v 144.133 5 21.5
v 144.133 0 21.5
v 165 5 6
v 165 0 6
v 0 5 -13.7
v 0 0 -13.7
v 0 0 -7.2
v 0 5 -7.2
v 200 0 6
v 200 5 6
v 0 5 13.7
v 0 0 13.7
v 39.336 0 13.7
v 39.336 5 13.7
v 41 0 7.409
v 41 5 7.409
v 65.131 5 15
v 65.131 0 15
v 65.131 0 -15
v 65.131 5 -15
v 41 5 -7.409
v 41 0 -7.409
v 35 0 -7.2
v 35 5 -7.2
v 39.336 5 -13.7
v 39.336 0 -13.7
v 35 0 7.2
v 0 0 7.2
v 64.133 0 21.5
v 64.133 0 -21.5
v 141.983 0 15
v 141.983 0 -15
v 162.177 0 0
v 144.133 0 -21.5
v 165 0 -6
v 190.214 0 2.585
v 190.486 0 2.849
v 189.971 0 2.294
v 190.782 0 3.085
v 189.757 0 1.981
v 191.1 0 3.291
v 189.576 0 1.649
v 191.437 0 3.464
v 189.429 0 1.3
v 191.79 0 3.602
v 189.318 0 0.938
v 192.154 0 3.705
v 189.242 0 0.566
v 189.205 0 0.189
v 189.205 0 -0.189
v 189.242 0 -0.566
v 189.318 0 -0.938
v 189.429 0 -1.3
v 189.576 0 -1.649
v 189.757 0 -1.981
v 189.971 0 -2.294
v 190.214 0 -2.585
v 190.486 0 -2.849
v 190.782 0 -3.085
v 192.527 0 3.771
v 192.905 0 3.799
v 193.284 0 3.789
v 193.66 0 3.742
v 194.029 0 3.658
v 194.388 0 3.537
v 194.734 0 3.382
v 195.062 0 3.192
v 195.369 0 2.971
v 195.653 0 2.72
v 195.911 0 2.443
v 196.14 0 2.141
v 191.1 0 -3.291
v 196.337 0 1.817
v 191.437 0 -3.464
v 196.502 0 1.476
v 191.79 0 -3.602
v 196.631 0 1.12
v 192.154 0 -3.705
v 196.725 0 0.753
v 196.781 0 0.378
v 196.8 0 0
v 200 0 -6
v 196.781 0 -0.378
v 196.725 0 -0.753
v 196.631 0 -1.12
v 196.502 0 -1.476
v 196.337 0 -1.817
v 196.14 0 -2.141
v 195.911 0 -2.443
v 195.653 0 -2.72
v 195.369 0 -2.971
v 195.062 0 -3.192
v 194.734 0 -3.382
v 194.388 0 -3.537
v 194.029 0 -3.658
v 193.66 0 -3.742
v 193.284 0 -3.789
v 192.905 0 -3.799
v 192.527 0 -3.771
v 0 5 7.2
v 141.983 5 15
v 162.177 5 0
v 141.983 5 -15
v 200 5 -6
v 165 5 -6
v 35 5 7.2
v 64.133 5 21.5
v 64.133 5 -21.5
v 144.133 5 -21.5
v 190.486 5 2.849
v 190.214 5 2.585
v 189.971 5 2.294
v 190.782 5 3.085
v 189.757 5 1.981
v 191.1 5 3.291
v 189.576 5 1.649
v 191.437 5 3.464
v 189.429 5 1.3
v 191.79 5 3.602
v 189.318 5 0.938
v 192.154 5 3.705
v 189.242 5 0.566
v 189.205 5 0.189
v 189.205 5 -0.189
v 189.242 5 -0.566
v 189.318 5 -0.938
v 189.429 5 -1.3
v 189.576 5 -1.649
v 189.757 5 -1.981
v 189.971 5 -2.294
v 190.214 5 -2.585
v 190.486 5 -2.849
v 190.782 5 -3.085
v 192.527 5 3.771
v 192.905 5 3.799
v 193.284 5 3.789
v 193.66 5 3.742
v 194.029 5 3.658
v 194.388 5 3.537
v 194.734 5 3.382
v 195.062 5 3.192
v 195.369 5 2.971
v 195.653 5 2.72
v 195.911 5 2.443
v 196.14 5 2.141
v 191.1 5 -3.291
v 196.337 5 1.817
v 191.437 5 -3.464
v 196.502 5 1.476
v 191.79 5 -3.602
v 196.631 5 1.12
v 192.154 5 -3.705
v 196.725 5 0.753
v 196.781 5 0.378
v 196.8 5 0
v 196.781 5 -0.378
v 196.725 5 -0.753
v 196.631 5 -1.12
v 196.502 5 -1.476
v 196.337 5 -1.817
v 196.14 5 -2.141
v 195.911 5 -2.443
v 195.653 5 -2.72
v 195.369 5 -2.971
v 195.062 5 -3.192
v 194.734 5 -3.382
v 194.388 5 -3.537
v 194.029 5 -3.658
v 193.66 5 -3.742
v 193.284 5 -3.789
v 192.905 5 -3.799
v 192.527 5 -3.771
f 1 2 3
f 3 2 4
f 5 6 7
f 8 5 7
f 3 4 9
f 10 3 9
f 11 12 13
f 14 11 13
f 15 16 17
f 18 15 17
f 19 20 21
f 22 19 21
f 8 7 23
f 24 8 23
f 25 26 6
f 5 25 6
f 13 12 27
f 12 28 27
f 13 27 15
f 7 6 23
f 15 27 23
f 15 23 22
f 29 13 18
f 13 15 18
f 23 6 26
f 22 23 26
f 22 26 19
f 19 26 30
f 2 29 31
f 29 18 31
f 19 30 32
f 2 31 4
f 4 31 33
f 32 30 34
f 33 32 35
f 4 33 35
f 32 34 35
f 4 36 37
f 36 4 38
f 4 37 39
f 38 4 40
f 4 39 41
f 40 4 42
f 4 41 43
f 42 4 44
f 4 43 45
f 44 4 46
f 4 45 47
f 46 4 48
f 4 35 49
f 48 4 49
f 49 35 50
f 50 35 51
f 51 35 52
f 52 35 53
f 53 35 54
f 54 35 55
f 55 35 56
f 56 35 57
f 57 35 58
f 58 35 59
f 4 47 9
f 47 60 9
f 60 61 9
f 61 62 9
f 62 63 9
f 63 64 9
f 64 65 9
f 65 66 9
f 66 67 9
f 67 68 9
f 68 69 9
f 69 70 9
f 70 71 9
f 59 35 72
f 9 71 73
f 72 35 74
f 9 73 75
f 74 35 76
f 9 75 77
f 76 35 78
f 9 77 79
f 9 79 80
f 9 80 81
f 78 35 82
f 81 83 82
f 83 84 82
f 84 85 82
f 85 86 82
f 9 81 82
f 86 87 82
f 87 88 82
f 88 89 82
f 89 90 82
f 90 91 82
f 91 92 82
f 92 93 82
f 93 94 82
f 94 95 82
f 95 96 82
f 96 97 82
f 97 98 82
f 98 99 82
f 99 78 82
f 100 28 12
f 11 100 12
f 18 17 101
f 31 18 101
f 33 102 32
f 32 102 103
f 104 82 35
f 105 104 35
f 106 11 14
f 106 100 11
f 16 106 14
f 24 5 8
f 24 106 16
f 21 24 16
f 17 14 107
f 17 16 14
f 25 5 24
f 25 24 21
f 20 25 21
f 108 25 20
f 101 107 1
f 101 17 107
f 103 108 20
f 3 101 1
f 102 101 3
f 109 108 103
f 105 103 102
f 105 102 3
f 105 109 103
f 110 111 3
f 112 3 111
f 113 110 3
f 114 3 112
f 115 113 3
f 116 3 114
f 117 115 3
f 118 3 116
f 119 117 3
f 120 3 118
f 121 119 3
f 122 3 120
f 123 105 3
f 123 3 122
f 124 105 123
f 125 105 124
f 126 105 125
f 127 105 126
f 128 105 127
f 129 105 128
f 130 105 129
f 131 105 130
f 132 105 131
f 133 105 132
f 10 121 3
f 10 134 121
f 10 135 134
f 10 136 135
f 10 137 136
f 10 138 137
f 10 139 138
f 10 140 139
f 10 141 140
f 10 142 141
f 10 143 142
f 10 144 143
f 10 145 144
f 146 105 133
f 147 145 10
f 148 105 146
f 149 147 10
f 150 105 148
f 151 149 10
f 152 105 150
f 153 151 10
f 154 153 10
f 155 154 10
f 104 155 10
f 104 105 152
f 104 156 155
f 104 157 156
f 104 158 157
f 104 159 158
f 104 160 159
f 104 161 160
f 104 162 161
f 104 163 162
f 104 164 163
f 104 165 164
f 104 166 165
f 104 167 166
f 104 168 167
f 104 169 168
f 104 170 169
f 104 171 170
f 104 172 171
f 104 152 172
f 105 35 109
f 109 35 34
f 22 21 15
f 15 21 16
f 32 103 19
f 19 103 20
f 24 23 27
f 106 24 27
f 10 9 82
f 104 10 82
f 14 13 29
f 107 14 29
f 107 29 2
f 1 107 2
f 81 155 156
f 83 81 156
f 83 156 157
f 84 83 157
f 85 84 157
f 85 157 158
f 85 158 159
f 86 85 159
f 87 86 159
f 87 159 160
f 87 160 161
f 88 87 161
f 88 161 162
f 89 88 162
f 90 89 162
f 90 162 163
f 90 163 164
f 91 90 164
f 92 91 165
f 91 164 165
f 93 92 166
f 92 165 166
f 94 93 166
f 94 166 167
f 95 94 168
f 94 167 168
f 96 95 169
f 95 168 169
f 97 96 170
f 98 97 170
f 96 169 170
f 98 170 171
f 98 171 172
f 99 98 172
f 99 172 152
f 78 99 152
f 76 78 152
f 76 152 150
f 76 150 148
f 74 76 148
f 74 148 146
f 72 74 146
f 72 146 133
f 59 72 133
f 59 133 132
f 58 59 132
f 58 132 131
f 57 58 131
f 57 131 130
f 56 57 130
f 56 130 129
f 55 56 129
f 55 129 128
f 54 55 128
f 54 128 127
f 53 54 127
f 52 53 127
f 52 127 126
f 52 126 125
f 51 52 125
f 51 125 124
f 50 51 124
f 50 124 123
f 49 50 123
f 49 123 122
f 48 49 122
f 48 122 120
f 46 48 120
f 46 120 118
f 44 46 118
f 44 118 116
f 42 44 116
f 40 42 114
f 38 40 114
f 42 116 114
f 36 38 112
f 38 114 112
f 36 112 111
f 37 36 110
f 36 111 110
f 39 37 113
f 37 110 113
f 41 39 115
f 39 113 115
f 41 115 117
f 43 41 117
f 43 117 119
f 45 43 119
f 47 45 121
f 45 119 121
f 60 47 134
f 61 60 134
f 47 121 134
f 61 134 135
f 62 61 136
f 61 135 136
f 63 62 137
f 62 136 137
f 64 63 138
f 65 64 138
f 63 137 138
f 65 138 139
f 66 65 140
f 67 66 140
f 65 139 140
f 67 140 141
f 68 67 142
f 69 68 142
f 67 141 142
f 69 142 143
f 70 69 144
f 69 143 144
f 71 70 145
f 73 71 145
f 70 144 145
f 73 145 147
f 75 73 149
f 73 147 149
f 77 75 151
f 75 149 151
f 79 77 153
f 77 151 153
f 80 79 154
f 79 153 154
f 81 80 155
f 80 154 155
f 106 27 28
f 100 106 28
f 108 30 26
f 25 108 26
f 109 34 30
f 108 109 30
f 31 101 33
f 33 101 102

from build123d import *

# Parameters (mm, degrees)
BOSS_EXTRUDE1_DEPTH = 5
SKETCH3_R           = 3.8
CUT_EXTRUDE1_DEPTH  = 6


with BuildPart() as part:
    # Sketch2 → Boss-Extrude1 (new body)
    with BuildSketch(Plane(origin=(0, 0, 0), x_dir=(1, 0, 0), z_dir=(0, 1, 0))):
        Polygon((0, -13.7), (39.336112578, -13.7), (64.132518911, -21.5), (144.132518911, -21.5), (165, -6), (200, -6), (200, 6), (165, 6), (144.132518911, 21.5), (64.132518911, 21.5), (39.336112578, 13.7), (0, 13.7), (0, 7.2), (35, 7.2), (35, -7.2), (0, -7.2), align=None)
    extrude(amount=BOSS_EXTRUDE1_DEPTH)

    # Sketch3 → Cut-Extrude1 (cut, through all)
    with BuildSketch(Plane(origin=(0, 5, 0), x_dir=(1, 0, 0), z_dir=(0, 1, 0))):
        with Locations((193, 0)):
            Circle(SKETCH3_R)
        Polygon((41, 7.409395112), (41, -7.409395112), (65.130733731, -15), (141.982577641, -15), (162.176914179, 0), (141.982577641, 15), (65.130733731, 15), align=None)
    extrude(amount=-CUT_EXTRUDE1_DEPTH, mode=Mode.SUBTRACT)


solid = part.part
